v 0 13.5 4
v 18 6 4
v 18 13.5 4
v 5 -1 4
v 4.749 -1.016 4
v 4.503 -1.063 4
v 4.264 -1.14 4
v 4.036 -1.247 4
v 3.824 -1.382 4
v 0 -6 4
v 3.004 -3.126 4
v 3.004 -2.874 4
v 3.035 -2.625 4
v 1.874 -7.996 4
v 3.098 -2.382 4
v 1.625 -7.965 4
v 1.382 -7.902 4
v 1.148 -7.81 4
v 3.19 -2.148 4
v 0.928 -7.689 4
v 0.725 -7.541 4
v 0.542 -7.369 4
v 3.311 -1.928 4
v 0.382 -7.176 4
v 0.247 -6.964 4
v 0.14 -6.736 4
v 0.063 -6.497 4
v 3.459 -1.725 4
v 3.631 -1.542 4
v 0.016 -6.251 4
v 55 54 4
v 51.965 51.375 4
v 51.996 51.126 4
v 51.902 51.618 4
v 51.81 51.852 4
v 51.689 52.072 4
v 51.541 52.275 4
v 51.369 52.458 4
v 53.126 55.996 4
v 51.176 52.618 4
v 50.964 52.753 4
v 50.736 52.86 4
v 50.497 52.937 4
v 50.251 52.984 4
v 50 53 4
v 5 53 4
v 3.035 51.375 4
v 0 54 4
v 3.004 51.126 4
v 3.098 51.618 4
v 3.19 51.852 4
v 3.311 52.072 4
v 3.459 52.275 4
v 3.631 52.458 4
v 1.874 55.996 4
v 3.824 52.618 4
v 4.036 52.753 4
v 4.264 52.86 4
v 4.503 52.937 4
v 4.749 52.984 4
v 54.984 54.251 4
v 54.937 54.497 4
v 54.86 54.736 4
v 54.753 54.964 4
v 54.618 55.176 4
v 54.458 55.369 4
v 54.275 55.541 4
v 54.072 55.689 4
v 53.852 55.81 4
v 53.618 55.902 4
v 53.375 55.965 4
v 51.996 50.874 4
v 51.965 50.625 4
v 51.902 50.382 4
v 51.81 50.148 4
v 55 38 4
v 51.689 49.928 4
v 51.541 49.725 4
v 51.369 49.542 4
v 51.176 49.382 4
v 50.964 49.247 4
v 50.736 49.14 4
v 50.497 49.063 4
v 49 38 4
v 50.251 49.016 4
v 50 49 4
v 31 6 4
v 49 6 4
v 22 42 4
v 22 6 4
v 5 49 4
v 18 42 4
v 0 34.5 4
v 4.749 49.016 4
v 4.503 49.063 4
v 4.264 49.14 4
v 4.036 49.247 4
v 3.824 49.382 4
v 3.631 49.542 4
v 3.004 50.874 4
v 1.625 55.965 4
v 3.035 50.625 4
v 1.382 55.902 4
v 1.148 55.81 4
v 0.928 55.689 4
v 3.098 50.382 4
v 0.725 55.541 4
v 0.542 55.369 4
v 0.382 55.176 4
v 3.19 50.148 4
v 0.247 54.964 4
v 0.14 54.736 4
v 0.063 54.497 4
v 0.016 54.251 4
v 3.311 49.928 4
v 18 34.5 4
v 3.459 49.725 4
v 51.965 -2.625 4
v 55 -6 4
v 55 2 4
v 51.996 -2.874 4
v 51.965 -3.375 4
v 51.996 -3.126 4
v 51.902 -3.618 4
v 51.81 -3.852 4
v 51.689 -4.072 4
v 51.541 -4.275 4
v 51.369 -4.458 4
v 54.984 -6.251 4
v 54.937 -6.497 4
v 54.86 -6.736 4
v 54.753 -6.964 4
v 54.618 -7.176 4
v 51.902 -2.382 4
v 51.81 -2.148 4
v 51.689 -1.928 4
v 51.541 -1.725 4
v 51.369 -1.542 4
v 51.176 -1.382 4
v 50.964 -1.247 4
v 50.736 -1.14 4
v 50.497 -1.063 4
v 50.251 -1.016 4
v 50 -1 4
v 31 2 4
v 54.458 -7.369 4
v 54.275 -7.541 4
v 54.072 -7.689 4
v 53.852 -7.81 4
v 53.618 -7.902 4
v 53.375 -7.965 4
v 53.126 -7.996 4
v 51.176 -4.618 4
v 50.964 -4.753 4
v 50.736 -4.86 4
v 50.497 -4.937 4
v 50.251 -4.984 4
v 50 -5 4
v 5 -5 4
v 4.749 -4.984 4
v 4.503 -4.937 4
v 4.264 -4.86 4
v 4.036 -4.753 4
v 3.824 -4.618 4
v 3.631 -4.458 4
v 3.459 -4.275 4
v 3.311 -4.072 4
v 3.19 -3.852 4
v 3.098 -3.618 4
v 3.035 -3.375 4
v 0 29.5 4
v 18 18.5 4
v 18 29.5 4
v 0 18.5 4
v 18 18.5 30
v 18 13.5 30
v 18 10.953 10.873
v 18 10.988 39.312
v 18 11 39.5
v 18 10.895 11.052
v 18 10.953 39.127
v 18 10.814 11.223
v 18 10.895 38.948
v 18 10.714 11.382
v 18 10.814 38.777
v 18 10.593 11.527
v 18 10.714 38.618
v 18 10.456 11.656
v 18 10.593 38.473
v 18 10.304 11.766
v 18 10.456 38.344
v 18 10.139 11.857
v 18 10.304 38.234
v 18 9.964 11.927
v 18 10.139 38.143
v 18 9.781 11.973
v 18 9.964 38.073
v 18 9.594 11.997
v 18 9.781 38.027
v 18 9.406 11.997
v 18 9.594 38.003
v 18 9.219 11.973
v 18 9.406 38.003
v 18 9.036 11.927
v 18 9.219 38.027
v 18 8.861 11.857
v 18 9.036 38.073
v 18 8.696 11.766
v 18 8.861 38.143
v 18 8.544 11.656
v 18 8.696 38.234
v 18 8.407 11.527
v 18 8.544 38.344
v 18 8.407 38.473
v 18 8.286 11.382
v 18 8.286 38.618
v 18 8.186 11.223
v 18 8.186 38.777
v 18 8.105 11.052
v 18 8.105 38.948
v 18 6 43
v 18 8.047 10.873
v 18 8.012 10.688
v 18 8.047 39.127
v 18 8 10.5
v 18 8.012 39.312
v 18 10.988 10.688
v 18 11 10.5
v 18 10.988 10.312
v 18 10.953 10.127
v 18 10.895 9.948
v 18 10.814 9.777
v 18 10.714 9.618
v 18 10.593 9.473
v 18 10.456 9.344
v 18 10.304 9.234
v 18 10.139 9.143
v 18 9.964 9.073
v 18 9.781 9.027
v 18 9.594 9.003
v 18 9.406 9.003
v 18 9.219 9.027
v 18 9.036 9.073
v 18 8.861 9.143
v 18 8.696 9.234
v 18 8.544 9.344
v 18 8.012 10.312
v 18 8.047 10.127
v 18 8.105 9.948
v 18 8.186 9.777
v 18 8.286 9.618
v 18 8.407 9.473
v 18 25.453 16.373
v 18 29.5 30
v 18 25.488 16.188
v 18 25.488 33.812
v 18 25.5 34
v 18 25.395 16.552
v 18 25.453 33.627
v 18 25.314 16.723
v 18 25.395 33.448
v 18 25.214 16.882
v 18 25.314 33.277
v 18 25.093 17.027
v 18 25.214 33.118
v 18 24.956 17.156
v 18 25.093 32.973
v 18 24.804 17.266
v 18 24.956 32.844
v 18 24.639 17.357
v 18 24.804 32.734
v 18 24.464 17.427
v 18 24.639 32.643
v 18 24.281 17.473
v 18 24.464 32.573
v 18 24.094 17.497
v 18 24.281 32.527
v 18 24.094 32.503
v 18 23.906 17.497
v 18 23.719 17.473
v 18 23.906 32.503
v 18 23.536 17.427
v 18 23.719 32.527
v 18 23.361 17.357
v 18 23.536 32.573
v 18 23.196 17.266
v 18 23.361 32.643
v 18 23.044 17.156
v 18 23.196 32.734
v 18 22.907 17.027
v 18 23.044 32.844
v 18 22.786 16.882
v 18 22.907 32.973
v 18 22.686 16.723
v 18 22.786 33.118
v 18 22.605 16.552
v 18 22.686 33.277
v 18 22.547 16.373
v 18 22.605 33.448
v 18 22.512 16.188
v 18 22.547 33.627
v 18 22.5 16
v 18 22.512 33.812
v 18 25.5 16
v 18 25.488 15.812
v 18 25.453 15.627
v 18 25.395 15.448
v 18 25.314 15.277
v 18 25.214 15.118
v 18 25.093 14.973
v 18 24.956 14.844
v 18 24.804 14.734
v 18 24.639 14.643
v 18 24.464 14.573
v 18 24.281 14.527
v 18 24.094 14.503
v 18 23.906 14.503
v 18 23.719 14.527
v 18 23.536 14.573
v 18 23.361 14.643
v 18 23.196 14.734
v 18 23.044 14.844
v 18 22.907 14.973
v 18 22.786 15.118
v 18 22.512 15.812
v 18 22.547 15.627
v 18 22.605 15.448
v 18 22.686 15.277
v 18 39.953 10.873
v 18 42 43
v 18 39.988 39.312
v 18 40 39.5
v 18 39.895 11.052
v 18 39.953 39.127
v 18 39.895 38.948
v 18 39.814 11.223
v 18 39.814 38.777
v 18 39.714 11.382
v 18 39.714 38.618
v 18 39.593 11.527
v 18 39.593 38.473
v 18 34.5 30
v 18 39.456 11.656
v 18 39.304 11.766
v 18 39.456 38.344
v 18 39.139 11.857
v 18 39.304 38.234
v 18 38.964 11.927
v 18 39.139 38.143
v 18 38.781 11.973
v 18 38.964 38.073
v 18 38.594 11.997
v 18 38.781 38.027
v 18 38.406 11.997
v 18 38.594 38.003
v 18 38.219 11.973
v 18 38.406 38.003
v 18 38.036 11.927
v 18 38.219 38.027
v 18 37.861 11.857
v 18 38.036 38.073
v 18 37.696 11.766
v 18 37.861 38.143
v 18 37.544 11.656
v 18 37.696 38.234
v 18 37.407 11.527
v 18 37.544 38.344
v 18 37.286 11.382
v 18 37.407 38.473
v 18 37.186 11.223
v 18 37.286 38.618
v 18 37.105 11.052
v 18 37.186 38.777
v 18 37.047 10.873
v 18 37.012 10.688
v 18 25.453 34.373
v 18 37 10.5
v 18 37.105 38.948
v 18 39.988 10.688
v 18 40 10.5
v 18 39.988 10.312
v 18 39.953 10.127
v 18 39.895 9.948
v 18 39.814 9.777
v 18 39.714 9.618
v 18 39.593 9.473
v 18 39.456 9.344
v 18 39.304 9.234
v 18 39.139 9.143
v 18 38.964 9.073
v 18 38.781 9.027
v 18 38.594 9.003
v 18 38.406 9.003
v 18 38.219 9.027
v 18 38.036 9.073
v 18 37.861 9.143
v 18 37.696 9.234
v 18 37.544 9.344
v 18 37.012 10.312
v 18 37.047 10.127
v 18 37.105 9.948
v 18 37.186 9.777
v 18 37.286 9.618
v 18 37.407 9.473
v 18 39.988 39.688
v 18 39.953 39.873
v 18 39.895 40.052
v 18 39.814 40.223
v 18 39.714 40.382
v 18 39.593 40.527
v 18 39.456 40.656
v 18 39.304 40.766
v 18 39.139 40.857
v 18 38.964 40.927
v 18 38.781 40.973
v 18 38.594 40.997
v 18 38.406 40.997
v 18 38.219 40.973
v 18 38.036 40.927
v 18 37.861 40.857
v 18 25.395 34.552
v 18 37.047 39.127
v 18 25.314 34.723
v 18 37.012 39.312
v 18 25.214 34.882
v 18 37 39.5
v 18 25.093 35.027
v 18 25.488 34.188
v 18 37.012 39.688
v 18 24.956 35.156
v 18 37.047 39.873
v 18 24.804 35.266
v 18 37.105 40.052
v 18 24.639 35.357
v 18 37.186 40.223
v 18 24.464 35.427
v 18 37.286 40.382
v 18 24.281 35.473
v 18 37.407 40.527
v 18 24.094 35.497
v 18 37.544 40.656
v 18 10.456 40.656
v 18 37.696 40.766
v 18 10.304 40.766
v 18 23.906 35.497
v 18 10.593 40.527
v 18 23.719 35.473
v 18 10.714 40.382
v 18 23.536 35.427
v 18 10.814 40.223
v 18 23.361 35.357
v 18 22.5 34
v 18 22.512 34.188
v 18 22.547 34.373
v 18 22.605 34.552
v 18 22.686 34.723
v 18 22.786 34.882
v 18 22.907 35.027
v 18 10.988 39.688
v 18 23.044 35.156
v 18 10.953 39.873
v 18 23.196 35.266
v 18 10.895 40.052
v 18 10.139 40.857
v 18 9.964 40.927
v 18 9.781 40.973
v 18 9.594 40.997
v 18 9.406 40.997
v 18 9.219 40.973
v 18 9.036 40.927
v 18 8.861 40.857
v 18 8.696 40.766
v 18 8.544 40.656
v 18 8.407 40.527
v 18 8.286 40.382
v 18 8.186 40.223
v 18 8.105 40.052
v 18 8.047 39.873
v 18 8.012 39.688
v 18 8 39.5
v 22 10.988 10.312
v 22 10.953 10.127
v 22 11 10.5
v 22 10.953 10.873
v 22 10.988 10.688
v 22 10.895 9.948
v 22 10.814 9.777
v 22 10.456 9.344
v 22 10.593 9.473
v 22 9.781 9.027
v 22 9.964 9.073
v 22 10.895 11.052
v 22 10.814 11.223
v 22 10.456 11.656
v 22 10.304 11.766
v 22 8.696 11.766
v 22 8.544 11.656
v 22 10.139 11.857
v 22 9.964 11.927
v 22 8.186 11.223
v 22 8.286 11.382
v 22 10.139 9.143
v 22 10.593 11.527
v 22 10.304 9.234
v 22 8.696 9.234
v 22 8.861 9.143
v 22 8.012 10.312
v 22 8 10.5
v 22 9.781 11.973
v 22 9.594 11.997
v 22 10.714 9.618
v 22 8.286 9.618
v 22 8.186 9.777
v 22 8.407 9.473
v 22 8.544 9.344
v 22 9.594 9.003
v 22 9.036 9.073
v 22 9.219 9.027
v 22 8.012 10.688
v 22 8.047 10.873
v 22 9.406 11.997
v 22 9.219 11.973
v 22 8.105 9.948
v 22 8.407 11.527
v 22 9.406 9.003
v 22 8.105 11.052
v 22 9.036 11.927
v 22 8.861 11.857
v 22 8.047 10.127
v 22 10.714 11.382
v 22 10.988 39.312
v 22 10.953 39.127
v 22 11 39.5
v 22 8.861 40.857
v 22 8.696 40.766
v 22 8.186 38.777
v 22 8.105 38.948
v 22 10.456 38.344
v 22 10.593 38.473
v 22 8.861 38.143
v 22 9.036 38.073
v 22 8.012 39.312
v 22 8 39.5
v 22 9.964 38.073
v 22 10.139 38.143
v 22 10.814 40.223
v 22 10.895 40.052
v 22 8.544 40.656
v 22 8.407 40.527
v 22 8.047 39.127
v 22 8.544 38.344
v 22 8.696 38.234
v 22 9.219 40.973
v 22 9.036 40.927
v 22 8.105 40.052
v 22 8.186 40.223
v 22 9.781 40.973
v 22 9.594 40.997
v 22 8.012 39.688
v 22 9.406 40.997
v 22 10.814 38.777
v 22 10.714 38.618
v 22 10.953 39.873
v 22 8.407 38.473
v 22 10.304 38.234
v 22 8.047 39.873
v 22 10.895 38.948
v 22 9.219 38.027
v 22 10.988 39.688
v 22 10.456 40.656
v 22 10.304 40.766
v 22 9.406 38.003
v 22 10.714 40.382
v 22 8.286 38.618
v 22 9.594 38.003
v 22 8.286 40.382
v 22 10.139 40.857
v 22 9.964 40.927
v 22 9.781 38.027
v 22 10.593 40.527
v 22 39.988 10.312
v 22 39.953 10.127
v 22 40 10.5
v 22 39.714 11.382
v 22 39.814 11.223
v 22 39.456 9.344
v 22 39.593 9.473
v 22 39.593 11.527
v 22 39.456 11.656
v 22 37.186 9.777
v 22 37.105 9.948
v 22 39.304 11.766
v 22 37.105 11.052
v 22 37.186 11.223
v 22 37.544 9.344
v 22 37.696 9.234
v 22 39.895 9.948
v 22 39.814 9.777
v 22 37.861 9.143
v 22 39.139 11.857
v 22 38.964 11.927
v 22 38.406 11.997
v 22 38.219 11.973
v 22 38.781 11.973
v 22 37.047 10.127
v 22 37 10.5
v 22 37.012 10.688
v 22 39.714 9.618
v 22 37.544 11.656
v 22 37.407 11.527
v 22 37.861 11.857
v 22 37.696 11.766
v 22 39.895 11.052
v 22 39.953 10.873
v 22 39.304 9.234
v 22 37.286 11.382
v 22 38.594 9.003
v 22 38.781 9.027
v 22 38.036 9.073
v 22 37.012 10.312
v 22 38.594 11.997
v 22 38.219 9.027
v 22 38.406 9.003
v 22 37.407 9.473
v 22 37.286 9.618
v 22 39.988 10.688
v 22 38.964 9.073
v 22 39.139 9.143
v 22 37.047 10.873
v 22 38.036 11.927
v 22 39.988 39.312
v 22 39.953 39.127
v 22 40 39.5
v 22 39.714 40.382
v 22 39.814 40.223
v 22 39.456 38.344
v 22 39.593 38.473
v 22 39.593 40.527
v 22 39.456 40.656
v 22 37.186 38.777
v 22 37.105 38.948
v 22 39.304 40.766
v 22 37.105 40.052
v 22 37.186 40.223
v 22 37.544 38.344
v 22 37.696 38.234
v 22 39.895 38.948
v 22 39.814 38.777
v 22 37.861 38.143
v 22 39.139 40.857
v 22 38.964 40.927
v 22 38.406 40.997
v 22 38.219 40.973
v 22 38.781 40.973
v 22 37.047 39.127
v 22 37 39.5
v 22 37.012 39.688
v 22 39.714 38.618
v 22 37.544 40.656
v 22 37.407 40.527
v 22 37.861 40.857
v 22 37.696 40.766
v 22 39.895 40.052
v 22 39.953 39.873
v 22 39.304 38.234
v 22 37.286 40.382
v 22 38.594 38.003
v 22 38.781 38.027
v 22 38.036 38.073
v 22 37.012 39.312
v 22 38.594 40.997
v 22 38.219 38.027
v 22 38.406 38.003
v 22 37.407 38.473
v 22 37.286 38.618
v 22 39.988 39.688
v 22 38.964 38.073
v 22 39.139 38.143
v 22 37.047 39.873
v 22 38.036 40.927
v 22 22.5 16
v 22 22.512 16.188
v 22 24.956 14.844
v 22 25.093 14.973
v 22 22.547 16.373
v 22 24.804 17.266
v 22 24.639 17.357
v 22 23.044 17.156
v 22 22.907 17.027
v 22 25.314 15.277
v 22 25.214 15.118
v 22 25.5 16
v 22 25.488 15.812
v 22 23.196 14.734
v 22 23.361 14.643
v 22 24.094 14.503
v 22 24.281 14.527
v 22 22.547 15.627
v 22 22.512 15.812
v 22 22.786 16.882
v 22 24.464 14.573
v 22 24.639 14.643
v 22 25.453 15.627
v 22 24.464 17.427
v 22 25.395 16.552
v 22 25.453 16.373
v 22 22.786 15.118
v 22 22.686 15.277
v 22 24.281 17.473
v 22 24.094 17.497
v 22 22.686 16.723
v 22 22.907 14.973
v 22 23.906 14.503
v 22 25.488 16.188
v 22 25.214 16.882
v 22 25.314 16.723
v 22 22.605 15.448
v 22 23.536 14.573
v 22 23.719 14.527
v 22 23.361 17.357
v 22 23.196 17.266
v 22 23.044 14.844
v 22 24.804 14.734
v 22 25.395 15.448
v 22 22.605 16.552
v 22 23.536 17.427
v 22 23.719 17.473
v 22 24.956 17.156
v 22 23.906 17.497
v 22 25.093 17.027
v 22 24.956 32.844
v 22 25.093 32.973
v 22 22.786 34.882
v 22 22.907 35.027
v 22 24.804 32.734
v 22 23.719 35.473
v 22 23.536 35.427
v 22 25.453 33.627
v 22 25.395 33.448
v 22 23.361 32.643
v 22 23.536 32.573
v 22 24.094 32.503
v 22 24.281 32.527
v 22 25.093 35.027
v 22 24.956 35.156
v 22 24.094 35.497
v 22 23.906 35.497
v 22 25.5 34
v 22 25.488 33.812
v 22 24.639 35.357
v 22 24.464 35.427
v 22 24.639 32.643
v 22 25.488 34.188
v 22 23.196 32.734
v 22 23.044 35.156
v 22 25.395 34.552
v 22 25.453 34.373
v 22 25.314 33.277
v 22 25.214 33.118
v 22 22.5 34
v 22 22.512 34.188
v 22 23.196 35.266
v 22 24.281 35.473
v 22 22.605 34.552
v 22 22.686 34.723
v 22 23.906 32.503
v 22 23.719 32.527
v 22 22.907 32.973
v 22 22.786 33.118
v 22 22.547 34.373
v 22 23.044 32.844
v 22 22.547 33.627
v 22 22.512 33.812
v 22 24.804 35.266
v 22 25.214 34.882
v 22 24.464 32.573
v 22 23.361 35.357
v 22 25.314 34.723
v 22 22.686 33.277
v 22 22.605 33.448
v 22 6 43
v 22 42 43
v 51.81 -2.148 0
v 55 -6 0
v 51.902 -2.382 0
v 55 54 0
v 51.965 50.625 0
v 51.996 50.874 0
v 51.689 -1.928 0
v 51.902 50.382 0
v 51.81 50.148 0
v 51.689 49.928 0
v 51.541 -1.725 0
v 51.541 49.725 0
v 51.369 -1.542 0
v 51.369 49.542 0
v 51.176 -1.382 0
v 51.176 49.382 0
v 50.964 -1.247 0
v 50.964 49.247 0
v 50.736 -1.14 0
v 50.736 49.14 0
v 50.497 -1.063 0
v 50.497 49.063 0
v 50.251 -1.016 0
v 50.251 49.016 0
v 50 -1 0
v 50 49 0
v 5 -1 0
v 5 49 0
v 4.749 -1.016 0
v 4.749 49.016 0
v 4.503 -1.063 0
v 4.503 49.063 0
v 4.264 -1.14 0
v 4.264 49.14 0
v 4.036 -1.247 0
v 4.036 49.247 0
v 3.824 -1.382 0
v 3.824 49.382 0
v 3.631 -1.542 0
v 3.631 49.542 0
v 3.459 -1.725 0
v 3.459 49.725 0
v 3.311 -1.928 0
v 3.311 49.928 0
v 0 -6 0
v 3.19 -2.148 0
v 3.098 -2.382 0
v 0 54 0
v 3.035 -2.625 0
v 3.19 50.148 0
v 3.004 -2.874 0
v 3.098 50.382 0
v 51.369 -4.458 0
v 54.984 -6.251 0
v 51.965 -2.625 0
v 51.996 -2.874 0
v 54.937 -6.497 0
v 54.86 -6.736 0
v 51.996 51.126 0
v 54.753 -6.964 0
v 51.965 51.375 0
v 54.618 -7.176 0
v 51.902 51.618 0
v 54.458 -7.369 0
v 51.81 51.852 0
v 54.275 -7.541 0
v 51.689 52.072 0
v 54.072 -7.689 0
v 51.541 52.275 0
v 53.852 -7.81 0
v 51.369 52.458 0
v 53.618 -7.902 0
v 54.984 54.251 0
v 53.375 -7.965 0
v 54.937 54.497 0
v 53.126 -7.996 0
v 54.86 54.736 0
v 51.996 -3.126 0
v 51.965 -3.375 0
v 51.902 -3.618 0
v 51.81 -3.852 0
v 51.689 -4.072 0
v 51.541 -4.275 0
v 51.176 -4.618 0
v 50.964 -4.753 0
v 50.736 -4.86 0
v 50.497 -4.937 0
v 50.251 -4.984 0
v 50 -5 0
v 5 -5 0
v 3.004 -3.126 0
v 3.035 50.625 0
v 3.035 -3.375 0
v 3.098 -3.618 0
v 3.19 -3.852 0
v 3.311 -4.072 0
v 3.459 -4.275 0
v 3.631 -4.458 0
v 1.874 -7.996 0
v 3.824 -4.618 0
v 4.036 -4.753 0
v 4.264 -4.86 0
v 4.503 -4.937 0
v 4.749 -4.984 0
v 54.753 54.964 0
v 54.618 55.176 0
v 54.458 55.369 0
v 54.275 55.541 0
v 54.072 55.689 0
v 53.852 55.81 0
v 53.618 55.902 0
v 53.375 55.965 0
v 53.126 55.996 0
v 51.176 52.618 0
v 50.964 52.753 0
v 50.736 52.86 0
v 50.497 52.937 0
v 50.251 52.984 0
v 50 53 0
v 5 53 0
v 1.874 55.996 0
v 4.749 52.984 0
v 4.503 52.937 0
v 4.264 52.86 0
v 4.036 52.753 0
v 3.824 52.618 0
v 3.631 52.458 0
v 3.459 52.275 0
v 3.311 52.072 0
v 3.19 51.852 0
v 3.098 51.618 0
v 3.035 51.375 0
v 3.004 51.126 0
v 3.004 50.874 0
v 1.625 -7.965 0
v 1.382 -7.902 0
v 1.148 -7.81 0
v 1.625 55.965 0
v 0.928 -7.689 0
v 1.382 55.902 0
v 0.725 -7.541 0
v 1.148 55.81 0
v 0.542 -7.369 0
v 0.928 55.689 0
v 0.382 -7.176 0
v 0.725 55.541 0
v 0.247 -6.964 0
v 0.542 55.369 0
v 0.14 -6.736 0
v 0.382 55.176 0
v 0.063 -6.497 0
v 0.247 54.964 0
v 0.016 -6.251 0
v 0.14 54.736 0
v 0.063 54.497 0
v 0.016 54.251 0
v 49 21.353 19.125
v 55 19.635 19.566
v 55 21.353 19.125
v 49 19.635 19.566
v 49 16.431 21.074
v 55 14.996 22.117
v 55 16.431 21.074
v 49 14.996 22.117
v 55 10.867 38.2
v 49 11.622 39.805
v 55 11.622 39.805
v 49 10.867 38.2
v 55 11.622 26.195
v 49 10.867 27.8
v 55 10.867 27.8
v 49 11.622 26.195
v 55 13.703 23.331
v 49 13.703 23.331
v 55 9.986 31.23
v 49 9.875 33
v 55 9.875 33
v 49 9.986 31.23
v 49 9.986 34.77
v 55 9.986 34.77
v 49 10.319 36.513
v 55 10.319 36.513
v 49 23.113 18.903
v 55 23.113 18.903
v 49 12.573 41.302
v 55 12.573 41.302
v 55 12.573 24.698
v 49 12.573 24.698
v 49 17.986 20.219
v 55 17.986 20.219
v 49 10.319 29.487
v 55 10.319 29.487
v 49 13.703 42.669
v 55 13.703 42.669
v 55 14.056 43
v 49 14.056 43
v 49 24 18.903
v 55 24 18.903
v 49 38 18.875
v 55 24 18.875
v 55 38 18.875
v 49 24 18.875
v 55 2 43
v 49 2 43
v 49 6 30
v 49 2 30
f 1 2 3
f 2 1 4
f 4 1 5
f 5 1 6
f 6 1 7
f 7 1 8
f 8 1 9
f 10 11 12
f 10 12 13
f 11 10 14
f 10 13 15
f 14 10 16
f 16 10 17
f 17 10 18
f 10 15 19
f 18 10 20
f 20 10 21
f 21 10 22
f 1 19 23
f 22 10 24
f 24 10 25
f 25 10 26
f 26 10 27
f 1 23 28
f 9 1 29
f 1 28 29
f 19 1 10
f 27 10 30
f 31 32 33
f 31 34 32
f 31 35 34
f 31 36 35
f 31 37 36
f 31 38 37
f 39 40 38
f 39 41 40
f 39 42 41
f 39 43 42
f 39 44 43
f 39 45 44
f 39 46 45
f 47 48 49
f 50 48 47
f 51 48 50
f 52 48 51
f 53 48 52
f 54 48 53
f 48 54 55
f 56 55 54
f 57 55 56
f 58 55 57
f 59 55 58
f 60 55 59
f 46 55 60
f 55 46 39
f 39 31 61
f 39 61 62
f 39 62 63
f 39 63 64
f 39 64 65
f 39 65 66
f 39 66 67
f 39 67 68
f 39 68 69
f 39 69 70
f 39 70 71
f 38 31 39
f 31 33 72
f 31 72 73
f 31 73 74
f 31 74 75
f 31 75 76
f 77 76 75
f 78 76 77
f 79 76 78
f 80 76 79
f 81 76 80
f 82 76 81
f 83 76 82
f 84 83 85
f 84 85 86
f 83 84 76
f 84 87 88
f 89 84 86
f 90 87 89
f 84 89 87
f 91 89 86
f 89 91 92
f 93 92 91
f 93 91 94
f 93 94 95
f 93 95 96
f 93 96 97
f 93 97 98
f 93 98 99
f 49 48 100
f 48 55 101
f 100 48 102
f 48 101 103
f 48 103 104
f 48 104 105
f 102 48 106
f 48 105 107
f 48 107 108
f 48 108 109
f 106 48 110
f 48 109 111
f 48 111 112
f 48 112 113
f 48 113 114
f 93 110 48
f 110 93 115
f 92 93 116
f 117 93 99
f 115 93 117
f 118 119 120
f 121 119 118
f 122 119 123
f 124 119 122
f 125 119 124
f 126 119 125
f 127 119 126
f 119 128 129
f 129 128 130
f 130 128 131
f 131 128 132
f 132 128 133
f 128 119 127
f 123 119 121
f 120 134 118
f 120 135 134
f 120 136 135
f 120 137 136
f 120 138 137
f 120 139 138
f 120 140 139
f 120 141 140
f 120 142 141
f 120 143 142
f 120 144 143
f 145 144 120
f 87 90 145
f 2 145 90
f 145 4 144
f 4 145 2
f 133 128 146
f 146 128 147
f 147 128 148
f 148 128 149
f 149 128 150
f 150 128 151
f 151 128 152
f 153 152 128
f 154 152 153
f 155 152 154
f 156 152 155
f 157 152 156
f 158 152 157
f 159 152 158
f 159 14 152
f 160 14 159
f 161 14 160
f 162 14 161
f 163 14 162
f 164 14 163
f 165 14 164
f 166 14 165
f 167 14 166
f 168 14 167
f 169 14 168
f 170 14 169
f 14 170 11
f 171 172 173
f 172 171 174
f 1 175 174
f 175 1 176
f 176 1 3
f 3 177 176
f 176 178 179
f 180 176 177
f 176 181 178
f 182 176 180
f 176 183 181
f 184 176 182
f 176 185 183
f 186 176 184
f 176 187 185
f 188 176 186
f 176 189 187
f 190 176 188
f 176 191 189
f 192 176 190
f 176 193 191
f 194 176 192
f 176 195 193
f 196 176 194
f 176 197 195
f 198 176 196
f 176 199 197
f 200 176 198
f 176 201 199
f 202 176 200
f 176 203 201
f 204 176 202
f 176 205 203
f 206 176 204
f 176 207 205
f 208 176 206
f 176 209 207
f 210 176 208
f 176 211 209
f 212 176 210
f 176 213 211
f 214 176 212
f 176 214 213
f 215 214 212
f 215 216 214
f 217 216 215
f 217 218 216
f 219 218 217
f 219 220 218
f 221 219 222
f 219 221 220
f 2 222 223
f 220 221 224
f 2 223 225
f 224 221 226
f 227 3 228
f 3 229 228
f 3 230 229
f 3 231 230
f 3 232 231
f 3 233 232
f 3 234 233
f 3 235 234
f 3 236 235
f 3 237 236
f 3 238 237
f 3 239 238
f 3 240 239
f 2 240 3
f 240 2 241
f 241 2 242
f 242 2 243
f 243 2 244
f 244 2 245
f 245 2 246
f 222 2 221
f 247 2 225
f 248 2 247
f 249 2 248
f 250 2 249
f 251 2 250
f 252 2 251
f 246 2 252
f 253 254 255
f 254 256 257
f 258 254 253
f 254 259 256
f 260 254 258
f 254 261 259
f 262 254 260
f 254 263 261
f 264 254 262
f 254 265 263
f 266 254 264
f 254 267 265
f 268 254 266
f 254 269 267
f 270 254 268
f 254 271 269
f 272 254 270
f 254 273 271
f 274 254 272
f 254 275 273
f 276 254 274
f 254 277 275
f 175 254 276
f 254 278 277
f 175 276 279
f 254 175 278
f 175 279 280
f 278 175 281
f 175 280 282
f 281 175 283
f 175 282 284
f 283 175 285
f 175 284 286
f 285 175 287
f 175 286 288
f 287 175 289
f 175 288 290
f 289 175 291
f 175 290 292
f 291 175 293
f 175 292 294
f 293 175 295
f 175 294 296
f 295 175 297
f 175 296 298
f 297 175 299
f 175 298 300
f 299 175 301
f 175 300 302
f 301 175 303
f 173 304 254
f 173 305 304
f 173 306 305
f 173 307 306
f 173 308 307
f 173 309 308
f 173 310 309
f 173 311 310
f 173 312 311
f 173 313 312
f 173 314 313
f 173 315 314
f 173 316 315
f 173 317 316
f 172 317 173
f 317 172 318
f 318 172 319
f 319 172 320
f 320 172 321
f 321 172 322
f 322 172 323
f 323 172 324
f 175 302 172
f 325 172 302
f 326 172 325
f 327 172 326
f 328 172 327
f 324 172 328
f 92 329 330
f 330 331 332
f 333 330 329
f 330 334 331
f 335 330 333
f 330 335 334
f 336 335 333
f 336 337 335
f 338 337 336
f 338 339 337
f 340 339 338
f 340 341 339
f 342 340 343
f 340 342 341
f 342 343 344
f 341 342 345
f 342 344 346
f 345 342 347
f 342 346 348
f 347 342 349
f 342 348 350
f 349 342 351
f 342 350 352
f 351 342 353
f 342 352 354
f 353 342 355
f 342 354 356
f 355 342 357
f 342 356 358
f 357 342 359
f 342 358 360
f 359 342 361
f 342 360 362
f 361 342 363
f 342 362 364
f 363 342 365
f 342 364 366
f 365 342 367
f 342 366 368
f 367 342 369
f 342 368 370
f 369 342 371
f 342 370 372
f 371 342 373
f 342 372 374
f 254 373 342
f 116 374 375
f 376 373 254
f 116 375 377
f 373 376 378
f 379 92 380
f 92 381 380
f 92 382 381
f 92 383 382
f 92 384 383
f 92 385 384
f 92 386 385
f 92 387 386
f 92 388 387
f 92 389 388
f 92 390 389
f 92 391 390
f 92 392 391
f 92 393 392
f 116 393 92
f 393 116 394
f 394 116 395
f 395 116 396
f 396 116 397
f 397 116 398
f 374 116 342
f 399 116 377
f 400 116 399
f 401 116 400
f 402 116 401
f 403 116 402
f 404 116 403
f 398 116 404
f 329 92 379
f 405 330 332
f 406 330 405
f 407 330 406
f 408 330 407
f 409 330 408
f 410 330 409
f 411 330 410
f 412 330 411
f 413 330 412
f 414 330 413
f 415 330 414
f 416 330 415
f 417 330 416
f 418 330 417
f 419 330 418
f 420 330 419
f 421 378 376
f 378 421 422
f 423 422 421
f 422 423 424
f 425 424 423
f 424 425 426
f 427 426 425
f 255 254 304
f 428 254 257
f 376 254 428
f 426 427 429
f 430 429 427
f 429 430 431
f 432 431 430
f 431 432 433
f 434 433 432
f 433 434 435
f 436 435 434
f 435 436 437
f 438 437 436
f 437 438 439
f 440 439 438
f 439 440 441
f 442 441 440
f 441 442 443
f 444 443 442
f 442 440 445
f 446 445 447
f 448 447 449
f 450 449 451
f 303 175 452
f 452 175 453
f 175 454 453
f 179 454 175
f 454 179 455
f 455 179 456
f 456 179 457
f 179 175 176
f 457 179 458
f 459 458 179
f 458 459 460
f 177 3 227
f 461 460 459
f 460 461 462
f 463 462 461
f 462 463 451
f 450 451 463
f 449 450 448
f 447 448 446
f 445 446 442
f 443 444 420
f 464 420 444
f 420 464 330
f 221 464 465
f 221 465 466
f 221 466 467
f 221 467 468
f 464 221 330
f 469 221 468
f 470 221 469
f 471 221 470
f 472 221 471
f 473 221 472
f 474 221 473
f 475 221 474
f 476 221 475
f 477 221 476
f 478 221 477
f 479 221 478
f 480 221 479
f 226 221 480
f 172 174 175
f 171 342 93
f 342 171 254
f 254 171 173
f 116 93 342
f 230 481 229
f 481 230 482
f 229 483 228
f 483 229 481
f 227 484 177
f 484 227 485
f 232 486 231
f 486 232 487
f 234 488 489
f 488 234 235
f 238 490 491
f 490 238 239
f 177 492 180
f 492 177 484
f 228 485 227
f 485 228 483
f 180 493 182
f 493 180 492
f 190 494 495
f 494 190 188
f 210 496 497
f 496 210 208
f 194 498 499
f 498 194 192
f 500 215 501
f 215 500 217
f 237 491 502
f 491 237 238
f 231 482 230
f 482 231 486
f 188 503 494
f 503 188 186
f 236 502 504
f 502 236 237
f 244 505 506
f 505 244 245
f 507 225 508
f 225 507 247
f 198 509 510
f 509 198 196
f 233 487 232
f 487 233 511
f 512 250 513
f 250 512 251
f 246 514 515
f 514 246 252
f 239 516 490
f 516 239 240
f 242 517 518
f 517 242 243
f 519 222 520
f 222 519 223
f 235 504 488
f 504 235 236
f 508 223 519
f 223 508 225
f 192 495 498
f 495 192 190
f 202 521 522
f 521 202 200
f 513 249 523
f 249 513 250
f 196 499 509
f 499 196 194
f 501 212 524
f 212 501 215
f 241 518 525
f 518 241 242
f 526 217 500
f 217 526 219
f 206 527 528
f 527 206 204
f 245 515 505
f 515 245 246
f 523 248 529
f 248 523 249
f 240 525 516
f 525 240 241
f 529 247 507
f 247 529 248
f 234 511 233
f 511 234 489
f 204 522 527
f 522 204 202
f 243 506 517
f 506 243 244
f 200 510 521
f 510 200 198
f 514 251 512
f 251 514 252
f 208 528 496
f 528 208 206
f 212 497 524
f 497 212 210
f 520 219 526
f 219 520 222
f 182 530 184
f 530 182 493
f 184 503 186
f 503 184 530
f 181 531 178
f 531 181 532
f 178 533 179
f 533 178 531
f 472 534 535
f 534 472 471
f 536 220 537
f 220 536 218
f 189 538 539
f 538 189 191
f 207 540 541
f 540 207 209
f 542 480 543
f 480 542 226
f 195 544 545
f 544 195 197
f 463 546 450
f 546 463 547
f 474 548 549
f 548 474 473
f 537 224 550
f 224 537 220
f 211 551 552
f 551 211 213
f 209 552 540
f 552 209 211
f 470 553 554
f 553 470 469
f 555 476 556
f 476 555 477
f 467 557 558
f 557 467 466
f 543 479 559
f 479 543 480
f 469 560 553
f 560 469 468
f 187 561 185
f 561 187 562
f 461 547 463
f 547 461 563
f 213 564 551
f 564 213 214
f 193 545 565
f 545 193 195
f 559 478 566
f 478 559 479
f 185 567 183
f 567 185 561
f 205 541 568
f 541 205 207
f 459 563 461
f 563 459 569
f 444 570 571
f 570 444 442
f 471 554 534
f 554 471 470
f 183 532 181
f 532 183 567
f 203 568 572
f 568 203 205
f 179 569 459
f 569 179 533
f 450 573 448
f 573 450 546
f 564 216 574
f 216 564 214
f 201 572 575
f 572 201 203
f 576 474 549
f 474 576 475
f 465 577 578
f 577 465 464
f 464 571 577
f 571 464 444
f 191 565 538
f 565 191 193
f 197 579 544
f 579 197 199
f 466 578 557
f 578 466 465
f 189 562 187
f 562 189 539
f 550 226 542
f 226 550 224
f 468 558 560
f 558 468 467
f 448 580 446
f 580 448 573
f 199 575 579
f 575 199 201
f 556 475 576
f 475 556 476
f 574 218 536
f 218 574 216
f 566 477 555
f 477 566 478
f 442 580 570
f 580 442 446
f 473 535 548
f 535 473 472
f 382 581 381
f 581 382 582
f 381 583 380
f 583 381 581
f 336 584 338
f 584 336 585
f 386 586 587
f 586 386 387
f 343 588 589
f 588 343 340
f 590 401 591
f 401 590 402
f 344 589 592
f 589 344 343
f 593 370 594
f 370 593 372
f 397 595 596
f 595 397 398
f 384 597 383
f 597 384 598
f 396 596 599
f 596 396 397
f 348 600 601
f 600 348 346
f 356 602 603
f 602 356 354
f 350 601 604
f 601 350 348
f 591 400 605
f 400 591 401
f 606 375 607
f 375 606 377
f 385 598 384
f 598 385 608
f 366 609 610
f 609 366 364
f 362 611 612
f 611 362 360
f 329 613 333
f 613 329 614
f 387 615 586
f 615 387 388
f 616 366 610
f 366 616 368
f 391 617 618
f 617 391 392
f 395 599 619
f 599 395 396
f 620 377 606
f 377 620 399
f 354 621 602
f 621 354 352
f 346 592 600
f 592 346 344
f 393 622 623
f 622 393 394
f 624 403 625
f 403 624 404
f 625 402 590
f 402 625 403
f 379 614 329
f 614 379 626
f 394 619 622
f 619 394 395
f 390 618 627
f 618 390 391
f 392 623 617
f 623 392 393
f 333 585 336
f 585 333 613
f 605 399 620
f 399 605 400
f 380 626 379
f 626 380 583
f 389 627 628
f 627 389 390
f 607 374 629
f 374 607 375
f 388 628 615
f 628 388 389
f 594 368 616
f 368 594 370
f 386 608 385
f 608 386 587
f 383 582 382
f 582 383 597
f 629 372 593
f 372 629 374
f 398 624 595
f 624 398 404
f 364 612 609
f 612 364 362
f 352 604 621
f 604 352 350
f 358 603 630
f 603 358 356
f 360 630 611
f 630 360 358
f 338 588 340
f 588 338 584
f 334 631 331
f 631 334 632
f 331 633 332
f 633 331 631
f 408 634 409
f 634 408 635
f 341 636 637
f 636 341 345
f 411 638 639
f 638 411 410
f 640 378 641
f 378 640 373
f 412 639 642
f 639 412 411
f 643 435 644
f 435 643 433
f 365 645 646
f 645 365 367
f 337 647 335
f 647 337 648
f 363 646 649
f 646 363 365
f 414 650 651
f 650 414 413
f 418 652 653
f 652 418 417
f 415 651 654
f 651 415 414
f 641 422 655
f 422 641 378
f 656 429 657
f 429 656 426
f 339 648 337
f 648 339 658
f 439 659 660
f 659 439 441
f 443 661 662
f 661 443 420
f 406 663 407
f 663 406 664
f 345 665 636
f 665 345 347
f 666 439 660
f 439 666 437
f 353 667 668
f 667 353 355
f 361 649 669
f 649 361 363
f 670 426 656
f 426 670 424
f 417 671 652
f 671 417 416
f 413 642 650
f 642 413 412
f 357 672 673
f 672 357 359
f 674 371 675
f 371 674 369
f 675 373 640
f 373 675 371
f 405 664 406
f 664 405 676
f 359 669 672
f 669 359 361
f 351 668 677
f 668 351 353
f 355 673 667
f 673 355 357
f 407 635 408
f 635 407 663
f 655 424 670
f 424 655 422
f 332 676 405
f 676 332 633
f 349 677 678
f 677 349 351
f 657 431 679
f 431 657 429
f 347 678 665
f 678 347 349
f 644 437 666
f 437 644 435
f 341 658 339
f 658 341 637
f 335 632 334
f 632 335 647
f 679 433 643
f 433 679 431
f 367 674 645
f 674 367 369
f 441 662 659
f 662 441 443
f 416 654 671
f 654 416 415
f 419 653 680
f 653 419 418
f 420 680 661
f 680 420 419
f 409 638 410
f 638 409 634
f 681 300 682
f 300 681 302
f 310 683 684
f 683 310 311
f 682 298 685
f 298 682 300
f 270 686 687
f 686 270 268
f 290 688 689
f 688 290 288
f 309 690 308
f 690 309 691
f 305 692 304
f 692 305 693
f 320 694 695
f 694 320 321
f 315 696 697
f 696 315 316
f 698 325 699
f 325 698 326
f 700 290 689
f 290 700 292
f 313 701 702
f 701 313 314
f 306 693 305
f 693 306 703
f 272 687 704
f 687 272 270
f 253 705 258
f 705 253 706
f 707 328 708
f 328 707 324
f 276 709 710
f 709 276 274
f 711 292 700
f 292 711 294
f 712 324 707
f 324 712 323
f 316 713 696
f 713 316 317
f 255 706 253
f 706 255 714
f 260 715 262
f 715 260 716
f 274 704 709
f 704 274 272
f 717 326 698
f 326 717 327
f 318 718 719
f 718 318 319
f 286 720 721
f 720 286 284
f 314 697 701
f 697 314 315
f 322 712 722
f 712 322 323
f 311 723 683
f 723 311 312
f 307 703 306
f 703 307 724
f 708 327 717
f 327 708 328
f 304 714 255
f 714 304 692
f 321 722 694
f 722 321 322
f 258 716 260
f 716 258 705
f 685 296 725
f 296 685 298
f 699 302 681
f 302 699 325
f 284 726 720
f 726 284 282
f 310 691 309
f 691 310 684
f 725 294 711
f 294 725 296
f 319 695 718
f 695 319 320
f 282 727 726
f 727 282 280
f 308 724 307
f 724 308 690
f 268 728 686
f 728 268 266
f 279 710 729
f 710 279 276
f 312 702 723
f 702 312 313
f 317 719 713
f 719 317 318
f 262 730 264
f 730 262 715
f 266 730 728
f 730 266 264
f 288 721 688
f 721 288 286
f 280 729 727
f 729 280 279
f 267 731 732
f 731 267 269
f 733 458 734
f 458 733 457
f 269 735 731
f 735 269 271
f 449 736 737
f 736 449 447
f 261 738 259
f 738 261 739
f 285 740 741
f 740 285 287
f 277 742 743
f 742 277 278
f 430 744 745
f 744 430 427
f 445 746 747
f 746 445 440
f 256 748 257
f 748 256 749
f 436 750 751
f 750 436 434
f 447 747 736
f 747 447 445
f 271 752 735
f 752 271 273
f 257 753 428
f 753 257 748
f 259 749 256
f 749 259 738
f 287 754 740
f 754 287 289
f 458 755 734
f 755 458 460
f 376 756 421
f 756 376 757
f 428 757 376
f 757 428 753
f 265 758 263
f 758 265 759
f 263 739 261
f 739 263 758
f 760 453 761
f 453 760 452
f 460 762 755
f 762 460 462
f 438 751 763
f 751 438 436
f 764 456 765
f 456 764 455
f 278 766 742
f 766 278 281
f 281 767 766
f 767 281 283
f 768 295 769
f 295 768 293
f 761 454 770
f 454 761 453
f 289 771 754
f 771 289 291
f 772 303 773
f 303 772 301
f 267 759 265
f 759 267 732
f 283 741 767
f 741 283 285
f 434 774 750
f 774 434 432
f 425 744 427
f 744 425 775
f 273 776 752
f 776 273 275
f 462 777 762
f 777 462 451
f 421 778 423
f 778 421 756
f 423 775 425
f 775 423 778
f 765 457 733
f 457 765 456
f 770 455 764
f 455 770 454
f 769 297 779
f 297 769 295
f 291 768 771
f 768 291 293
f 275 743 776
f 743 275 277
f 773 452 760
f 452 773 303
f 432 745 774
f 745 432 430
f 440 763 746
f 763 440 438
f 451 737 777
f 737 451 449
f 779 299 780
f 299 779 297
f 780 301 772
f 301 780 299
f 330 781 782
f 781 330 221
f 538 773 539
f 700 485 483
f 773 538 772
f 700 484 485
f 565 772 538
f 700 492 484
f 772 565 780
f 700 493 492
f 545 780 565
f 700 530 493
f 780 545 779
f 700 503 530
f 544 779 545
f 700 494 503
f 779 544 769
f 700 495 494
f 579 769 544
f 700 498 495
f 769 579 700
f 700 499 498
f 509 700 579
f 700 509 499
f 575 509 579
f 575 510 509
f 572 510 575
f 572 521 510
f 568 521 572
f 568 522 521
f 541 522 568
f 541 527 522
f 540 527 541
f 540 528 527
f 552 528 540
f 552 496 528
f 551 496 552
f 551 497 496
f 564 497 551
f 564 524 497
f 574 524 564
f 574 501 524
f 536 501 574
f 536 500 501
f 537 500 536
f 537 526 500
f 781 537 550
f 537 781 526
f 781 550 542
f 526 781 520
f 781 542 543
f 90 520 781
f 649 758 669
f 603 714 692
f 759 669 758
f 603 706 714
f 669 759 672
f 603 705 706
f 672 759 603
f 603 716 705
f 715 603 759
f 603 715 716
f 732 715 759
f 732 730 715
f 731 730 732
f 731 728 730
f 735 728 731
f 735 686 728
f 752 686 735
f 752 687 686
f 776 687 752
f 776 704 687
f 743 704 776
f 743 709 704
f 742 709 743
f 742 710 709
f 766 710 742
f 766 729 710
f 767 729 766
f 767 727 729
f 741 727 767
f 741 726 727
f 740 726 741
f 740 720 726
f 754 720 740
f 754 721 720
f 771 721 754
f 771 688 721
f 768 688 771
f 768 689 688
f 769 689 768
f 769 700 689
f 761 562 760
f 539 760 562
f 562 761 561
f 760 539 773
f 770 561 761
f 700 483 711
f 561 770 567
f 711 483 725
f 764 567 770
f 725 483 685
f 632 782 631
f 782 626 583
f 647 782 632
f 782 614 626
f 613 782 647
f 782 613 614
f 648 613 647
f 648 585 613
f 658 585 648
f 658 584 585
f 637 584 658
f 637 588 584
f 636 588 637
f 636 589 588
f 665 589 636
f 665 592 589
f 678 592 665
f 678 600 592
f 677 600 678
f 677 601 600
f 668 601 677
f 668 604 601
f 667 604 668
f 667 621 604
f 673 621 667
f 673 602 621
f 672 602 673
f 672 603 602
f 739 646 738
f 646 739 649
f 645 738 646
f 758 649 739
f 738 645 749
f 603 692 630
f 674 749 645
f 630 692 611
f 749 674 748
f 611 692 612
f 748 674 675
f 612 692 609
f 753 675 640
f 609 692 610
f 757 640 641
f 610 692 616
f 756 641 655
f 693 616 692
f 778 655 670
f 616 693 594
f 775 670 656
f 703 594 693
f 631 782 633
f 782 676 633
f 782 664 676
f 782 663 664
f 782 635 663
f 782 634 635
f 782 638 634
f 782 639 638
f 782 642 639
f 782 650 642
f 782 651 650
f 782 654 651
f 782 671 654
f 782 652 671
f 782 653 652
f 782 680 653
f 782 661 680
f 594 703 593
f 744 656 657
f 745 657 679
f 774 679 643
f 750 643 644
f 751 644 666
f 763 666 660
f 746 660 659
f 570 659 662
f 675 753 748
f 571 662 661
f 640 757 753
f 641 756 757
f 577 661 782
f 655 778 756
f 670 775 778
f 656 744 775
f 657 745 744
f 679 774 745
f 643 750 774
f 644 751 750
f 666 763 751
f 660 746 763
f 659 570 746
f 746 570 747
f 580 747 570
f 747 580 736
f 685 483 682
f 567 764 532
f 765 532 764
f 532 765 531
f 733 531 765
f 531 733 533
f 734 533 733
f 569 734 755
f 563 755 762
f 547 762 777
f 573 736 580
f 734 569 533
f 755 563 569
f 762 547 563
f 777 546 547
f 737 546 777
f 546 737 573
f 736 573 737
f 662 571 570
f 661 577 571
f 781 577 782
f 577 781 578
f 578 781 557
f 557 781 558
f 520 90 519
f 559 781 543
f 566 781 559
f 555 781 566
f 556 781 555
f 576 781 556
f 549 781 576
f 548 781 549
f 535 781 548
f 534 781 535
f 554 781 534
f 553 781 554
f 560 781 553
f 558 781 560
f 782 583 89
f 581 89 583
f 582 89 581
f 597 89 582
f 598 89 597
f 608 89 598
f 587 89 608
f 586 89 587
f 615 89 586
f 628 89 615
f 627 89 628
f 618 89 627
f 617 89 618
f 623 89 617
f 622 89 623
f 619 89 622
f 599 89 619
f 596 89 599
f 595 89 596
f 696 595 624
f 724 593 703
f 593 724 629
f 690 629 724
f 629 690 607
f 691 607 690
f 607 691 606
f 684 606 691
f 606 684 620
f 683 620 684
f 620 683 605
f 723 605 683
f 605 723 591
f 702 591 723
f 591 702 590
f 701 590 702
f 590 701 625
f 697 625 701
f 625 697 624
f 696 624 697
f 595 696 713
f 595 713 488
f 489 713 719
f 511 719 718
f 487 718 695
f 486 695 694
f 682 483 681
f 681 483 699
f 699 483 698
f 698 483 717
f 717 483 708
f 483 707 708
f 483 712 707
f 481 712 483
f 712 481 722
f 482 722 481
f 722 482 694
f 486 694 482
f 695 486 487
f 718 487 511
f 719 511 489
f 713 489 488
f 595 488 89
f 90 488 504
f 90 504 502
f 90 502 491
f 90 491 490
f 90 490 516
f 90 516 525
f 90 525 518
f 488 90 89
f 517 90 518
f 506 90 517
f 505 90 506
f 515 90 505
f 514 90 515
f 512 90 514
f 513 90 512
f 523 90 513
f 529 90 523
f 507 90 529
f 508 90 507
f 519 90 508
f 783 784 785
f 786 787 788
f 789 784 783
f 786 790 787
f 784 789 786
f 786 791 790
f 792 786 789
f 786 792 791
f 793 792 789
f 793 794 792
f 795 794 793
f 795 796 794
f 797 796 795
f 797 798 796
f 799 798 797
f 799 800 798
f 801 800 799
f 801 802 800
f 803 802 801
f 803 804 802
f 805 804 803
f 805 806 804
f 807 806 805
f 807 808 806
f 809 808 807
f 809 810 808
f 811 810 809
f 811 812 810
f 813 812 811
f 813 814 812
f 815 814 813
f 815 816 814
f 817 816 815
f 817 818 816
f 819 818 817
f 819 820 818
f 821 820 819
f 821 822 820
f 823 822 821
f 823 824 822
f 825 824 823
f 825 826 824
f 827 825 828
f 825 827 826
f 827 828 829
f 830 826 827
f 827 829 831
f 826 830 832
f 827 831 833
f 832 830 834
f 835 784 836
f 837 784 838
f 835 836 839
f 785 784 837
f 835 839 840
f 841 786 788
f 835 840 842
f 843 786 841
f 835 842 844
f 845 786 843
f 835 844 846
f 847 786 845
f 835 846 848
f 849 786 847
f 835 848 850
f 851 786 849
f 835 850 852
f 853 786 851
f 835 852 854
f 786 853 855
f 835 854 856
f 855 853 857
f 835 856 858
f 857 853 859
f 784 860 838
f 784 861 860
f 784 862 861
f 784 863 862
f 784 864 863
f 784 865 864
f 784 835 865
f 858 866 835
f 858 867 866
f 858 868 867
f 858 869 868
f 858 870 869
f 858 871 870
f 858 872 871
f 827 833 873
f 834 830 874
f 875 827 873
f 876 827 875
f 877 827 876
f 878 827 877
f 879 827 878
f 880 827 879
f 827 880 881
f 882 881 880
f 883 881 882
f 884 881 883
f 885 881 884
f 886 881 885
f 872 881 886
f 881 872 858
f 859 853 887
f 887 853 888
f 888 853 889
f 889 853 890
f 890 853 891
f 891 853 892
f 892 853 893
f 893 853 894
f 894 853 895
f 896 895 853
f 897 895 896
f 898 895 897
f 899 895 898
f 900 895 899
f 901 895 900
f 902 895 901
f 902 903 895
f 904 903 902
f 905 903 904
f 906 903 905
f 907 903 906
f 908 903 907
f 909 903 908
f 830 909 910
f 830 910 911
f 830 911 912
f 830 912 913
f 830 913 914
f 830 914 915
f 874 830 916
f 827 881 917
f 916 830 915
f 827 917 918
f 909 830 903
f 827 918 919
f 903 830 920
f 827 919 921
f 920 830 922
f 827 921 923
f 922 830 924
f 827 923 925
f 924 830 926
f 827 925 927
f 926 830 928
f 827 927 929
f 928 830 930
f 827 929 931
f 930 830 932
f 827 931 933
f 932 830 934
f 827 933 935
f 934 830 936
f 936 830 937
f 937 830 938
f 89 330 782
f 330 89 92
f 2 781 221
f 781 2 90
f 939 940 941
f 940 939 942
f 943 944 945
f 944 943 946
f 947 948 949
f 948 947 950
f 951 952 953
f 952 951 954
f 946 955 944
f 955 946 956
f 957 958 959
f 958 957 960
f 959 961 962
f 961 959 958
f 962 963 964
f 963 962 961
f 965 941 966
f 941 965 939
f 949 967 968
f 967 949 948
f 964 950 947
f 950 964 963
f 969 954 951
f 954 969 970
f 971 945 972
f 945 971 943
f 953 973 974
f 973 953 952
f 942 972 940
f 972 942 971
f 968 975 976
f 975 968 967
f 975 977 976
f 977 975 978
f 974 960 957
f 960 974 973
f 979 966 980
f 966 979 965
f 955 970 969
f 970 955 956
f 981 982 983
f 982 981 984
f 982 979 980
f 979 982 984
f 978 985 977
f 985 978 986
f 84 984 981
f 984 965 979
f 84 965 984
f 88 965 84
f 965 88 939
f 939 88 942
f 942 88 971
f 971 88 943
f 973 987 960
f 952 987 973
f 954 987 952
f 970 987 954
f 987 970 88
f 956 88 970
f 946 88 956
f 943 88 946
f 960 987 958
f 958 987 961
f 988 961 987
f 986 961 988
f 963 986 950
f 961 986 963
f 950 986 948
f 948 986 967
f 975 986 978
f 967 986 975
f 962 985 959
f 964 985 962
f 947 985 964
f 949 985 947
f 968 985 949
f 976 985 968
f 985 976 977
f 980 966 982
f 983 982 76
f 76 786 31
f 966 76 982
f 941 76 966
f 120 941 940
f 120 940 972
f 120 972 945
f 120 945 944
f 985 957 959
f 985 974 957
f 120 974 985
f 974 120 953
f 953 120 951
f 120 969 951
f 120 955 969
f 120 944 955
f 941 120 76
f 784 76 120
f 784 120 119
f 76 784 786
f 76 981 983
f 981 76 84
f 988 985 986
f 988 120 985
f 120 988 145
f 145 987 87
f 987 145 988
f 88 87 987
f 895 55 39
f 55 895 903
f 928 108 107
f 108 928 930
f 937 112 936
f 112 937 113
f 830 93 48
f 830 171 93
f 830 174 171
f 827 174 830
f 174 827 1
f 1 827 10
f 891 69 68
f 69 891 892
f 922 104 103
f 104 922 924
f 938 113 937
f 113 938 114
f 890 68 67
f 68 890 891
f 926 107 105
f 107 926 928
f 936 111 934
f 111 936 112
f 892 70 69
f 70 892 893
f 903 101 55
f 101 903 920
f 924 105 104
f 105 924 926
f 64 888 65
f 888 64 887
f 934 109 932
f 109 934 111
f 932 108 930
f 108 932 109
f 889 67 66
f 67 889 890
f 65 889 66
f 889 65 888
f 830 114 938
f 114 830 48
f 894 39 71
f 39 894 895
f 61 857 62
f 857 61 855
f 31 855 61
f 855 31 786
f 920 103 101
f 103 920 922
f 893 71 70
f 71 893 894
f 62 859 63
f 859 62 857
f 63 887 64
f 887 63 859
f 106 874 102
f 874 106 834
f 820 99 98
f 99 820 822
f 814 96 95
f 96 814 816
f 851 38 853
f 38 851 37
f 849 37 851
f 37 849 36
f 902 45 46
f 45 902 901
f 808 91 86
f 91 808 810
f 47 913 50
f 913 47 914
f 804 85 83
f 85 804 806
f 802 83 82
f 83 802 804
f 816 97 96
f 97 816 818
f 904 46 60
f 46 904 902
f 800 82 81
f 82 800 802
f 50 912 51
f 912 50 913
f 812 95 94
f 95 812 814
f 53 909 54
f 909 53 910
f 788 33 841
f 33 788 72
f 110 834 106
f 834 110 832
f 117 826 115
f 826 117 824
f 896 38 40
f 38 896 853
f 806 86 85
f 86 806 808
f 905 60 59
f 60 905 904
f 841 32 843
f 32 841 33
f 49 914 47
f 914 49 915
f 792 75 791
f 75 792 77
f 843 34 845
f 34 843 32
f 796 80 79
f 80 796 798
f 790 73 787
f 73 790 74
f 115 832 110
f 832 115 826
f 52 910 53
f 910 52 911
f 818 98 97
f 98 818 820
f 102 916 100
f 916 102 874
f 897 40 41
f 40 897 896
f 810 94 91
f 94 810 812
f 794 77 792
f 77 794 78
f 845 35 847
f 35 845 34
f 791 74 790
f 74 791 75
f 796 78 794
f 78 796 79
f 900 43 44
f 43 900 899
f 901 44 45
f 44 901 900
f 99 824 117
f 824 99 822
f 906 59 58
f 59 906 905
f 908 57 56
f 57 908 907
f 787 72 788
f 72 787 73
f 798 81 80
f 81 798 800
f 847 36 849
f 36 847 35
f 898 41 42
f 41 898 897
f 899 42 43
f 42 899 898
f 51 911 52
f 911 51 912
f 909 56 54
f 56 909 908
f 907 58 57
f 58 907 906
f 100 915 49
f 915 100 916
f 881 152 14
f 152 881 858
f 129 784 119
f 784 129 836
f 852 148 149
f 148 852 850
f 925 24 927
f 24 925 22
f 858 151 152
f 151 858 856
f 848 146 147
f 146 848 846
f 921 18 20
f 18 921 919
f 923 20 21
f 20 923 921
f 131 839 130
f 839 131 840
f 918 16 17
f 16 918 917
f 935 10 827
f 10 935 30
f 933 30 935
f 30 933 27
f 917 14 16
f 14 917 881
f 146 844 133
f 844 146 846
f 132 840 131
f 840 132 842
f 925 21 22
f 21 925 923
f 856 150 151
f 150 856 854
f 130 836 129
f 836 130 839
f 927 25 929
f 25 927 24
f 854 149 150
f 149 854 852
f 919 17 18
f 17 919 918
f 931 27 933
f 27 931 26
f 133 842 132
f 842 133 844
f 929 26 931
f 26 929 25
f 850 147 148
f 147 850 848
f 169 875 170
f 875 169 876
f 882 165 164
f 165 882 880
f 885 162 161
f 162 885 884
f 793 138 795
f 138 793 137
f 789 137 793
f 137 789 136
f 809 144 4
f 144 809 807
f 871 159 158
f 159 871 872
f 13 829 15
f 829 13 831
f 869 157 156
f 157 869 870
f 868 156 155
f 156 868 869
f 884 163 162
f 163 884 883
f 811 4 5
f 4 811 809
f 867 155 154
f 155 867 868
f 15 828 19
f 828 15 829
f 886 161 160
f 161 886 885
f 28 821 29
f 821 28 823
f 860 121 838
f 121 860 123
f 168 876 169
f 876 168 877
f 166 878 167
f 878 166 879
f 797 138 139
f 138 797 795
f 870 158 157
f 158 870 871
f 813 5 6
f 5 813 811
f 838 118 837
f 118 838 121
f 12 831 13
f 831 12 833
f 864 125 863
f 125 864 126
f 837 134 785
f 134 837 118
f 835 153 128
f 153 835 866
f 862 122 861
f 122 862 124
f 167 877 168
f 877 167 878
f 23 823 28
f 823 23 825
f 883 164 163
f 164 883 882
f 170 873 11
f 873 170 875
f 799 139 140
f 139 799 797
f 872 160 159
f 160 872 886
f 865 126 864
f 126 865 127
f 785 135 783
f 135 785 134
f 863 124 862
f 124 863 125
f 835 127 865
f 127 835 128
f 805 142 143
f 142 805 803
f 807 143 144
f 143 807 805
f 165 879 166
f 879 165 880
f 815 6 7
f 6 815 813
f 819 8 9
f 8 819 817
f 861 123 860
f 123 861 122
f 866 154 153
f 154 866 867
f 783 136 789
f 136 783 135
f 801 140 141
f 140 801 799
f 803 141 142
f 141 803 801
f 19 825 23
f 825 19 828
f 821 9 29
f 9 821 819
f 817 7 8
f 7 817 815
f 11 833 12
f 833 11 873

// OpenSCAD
$fn=50;
THICKNESS = 4;

CAM_DISTANCE_FROM_BASE = 7; // was 15
CAM_WIDTH = 36;
CAM_HEIGHT = 36;
CAM_HOLE_SPACING = 29;
CAM_HOLE_D = 3;
CAM_HOLE_R = CAM_HOLE_D/2;
CAM_TOTAL_HEIGHT = CAM_DISTANCE_FROM_BASE + CAM_HEIGHT;
CAM_HOLE_OFFSET = (CAM_WIDTH - CAM_HOLE_SPACING)/2;

// The back of the Arducam has two screw heads sticking out.
// These screws hold the lens mount in place.
CAM_SCREW_HOLES_DISTANCE = 9;
CAM_SCREW_HOLES_R = 2;

BRACE_LENGTH = 18;
BRACE_HEIGHT = 26;
BRACE_THICKNESS = 5;
BRACE_OFFSET = 10;

LENS_CENTER_FROM_BASE = 33;
LENS_D = 28.25;
LENS_R = LENS_D/2;
DISTANCE_LENS = 27;

LENS_SUPPORT_THICKNESS = 6;
LENS_SUPPORT_POSITION = BRACE_LENGTH + LENS_SUPPORT_THICKNESS + DISTANCE_LENS;
LENS_SUPPORT_BUFFER = 4;
LENS_SUPPORT_CHOP = 10;

BASE_BUFFER = 6;
BASE_LENGTH = BRACE_LENGTH + THICKNESS + DISTANCE_LENS + LENS_SUPPORT_THICKNESS;
BASE_WIDTH = CAM_WIDTH + BASE_BUFFER*2;

module prism(l, w, h){
   polyhedron(
       points=[[0,0,0], [l,0,0], [l,w,0], [0,w,0], [0,w,h], [l,w,h]],
       faces=[[0,1,2,3],[5,4,3,2],[0,4,5,1],[0,3,4],[5,2,1]]
    );   
}

module hole(r){
    rotate ([0,0,90]) {
        cylinder (h=16, r=r, center=true);
    }
}

// Base
cube([BASE_LENGTH, BASE_WIDTH, THICKNESS]);    

translate([ THICKNESS, BASE_BUFFER, 0 ]){
    // Braces
    rotate([0,0,-90]){
        translate([ 0, -THICKNESS, THICKNESS]){
            translate([ -BRACE_OFFSET - BRACE_THICKNESS/2, 0, 0])
            prism( BRACE_THICKNESS, BRACE_LENGTH, BRACE_HEIGHT );
        }

        translate([-CAM_WIDTH, -THICKNESS, THICKNESS]){
            translate([ BRACE_OFFSET - BRACE_THICKNESS/2, 0, 0])
            prism( BRACE_THICKNESS, BRACE_LENGTH, BRACE_HEIGHT );
        }
    }
    
    // Camera plate
    translate([BRACE_LENGTH, 0, 0]) {
        rotate([0,-90,0]){
            difference(){
                cube([CAM_TOTAL_HEIGHT, CAM_WIDTH, THICKNESS]);
                
                // Arducam mount holes
                translate([CAM_HOLE_OFFSET + CAM_DISTANCE_FROM_BASE, CAM_HOLE_OFFSET, 0]){
                    hole(CAM_HOLE_R);
                    
                    translate([CAM_HOLE_SPACING, 0, 0])
                    hole(CAM_HOLE_R);
                    
                    translate([0, CAM_HOLE_SPACING, 0])
                    hole(CAM_HOLE_R);

                    translate([CAM_HOLE_SPACING, CAM_HOLE_SPACING, 0])
                    hole(CAM_HOLE_R);
                }

                // Screw holes
                translate([CAM_DISTANCE_FROM_BASE, 0, 0]){
                    translate([CAM_SCREW_HOLES_DISTANCE, CAM_WIDTH/2, 0])
                    hole(CAM_HOLE_R);

                    translate([CAM_WIDTH-CAM_SCREW_HOLES_DISTANCE, CAM_WIDTH/2, 0])
                    hole(CAM_HOLE_R);
                }                
            }
        }
    }
    
    // Lens support
    translate([ LENS_SUPPORT_POSITION, -LENS_SUPPORT_BUFFER, 0]){
        rotate([0,-90,0]){
            difference(){
                cube([CAM_TOTAL_HEIGHT, CAM_WIDTH, LENS_SUPPORT_THICKNESS]);
                
                translate([LENS_CENTER_FROM_BASE, CAM_HEIGHT/2 + LENS_SUPPORT_BUFFER, 0]){
                    hole(LENS_R);
                    translate([-LENS_R, 0, -LENS_SUPPORT_THICKNESS/2])
                    cube([LENS_D + LENS_SUPPORT_CHOP, LENS_D, LENS_SUPPORT_THICKNESS*2]);
                }
            }
        }
        // Brace
        rotate( [0,0,-90] ){
            translate([ -THICKNESS, -BRACE_LENGTH-LENS_SUPPORT_THICKNESS,THICKNESS])
            prism( THICKNESS, BRACE_LENGTH, BRACE_HEIGHT );
        }
    }
}

SLOT_BLOCK_BUFFER = 3;
SLOT_LENGTH = BASE_LENGTH - (SLOT_BLOCK_BUFFER*2);
SLOT_HEIGHT = 4;
SLOT_BLOCK_POSITION = 0;
SLOT_BLOCK_LENGTH = SLOT_LENGTH + (SLOT_BLOCK_BUFFER*2);
SLOT_BLOCK_HEIGHT = SLOT_HEIGHT + (SLOT_BLOCK_BUFFER*2);
SLOT_ROUNDED_R = 2;

module slot() {
    translate([ SLOT_LENGTH/2+SLOT_BLOCK_BUFFER, SLOT_HEIGHT/2+SLOT_BLOCK_BUFFER, THICKNESS/2 ]) {
        difference() {
            minkowski() {
                cube([SLOT_BLOCK_LENGTH-(SLOT_ROUNDED_R*2), SLOT_BLOCK_HEIGHT-(SLOT_ROUNDED_R*2), THICKNESS/2], center=true);
                cylinder (h=THICKNESS/2, r=SLOT_ROUNDED_R, center=true);
            }
         
            hull() {
                translate([ -SLOT_LENGTH/2 + SLOT_HEIGHT/2, 0, 0 ])
                hole(SLOT_HEIGHT/2);

                translate([ SLOT_LENGTH/2 - SLOT_HEIGHT/2, 0, 0 ])
                hole(SLOT_HEIGHT/2);
            }    
        }
    }
}

translate([ SLOT_BLOCK_POSITION, BASE_WIDTH - SLOT_HEIGHT/2, 0 ])
slot();

translate([ SLOT_BLOCK_POSITION, -SLOT_BLOCK_HEIGHT + SLOT_HEIGHT/2, 0 ])
slot();
